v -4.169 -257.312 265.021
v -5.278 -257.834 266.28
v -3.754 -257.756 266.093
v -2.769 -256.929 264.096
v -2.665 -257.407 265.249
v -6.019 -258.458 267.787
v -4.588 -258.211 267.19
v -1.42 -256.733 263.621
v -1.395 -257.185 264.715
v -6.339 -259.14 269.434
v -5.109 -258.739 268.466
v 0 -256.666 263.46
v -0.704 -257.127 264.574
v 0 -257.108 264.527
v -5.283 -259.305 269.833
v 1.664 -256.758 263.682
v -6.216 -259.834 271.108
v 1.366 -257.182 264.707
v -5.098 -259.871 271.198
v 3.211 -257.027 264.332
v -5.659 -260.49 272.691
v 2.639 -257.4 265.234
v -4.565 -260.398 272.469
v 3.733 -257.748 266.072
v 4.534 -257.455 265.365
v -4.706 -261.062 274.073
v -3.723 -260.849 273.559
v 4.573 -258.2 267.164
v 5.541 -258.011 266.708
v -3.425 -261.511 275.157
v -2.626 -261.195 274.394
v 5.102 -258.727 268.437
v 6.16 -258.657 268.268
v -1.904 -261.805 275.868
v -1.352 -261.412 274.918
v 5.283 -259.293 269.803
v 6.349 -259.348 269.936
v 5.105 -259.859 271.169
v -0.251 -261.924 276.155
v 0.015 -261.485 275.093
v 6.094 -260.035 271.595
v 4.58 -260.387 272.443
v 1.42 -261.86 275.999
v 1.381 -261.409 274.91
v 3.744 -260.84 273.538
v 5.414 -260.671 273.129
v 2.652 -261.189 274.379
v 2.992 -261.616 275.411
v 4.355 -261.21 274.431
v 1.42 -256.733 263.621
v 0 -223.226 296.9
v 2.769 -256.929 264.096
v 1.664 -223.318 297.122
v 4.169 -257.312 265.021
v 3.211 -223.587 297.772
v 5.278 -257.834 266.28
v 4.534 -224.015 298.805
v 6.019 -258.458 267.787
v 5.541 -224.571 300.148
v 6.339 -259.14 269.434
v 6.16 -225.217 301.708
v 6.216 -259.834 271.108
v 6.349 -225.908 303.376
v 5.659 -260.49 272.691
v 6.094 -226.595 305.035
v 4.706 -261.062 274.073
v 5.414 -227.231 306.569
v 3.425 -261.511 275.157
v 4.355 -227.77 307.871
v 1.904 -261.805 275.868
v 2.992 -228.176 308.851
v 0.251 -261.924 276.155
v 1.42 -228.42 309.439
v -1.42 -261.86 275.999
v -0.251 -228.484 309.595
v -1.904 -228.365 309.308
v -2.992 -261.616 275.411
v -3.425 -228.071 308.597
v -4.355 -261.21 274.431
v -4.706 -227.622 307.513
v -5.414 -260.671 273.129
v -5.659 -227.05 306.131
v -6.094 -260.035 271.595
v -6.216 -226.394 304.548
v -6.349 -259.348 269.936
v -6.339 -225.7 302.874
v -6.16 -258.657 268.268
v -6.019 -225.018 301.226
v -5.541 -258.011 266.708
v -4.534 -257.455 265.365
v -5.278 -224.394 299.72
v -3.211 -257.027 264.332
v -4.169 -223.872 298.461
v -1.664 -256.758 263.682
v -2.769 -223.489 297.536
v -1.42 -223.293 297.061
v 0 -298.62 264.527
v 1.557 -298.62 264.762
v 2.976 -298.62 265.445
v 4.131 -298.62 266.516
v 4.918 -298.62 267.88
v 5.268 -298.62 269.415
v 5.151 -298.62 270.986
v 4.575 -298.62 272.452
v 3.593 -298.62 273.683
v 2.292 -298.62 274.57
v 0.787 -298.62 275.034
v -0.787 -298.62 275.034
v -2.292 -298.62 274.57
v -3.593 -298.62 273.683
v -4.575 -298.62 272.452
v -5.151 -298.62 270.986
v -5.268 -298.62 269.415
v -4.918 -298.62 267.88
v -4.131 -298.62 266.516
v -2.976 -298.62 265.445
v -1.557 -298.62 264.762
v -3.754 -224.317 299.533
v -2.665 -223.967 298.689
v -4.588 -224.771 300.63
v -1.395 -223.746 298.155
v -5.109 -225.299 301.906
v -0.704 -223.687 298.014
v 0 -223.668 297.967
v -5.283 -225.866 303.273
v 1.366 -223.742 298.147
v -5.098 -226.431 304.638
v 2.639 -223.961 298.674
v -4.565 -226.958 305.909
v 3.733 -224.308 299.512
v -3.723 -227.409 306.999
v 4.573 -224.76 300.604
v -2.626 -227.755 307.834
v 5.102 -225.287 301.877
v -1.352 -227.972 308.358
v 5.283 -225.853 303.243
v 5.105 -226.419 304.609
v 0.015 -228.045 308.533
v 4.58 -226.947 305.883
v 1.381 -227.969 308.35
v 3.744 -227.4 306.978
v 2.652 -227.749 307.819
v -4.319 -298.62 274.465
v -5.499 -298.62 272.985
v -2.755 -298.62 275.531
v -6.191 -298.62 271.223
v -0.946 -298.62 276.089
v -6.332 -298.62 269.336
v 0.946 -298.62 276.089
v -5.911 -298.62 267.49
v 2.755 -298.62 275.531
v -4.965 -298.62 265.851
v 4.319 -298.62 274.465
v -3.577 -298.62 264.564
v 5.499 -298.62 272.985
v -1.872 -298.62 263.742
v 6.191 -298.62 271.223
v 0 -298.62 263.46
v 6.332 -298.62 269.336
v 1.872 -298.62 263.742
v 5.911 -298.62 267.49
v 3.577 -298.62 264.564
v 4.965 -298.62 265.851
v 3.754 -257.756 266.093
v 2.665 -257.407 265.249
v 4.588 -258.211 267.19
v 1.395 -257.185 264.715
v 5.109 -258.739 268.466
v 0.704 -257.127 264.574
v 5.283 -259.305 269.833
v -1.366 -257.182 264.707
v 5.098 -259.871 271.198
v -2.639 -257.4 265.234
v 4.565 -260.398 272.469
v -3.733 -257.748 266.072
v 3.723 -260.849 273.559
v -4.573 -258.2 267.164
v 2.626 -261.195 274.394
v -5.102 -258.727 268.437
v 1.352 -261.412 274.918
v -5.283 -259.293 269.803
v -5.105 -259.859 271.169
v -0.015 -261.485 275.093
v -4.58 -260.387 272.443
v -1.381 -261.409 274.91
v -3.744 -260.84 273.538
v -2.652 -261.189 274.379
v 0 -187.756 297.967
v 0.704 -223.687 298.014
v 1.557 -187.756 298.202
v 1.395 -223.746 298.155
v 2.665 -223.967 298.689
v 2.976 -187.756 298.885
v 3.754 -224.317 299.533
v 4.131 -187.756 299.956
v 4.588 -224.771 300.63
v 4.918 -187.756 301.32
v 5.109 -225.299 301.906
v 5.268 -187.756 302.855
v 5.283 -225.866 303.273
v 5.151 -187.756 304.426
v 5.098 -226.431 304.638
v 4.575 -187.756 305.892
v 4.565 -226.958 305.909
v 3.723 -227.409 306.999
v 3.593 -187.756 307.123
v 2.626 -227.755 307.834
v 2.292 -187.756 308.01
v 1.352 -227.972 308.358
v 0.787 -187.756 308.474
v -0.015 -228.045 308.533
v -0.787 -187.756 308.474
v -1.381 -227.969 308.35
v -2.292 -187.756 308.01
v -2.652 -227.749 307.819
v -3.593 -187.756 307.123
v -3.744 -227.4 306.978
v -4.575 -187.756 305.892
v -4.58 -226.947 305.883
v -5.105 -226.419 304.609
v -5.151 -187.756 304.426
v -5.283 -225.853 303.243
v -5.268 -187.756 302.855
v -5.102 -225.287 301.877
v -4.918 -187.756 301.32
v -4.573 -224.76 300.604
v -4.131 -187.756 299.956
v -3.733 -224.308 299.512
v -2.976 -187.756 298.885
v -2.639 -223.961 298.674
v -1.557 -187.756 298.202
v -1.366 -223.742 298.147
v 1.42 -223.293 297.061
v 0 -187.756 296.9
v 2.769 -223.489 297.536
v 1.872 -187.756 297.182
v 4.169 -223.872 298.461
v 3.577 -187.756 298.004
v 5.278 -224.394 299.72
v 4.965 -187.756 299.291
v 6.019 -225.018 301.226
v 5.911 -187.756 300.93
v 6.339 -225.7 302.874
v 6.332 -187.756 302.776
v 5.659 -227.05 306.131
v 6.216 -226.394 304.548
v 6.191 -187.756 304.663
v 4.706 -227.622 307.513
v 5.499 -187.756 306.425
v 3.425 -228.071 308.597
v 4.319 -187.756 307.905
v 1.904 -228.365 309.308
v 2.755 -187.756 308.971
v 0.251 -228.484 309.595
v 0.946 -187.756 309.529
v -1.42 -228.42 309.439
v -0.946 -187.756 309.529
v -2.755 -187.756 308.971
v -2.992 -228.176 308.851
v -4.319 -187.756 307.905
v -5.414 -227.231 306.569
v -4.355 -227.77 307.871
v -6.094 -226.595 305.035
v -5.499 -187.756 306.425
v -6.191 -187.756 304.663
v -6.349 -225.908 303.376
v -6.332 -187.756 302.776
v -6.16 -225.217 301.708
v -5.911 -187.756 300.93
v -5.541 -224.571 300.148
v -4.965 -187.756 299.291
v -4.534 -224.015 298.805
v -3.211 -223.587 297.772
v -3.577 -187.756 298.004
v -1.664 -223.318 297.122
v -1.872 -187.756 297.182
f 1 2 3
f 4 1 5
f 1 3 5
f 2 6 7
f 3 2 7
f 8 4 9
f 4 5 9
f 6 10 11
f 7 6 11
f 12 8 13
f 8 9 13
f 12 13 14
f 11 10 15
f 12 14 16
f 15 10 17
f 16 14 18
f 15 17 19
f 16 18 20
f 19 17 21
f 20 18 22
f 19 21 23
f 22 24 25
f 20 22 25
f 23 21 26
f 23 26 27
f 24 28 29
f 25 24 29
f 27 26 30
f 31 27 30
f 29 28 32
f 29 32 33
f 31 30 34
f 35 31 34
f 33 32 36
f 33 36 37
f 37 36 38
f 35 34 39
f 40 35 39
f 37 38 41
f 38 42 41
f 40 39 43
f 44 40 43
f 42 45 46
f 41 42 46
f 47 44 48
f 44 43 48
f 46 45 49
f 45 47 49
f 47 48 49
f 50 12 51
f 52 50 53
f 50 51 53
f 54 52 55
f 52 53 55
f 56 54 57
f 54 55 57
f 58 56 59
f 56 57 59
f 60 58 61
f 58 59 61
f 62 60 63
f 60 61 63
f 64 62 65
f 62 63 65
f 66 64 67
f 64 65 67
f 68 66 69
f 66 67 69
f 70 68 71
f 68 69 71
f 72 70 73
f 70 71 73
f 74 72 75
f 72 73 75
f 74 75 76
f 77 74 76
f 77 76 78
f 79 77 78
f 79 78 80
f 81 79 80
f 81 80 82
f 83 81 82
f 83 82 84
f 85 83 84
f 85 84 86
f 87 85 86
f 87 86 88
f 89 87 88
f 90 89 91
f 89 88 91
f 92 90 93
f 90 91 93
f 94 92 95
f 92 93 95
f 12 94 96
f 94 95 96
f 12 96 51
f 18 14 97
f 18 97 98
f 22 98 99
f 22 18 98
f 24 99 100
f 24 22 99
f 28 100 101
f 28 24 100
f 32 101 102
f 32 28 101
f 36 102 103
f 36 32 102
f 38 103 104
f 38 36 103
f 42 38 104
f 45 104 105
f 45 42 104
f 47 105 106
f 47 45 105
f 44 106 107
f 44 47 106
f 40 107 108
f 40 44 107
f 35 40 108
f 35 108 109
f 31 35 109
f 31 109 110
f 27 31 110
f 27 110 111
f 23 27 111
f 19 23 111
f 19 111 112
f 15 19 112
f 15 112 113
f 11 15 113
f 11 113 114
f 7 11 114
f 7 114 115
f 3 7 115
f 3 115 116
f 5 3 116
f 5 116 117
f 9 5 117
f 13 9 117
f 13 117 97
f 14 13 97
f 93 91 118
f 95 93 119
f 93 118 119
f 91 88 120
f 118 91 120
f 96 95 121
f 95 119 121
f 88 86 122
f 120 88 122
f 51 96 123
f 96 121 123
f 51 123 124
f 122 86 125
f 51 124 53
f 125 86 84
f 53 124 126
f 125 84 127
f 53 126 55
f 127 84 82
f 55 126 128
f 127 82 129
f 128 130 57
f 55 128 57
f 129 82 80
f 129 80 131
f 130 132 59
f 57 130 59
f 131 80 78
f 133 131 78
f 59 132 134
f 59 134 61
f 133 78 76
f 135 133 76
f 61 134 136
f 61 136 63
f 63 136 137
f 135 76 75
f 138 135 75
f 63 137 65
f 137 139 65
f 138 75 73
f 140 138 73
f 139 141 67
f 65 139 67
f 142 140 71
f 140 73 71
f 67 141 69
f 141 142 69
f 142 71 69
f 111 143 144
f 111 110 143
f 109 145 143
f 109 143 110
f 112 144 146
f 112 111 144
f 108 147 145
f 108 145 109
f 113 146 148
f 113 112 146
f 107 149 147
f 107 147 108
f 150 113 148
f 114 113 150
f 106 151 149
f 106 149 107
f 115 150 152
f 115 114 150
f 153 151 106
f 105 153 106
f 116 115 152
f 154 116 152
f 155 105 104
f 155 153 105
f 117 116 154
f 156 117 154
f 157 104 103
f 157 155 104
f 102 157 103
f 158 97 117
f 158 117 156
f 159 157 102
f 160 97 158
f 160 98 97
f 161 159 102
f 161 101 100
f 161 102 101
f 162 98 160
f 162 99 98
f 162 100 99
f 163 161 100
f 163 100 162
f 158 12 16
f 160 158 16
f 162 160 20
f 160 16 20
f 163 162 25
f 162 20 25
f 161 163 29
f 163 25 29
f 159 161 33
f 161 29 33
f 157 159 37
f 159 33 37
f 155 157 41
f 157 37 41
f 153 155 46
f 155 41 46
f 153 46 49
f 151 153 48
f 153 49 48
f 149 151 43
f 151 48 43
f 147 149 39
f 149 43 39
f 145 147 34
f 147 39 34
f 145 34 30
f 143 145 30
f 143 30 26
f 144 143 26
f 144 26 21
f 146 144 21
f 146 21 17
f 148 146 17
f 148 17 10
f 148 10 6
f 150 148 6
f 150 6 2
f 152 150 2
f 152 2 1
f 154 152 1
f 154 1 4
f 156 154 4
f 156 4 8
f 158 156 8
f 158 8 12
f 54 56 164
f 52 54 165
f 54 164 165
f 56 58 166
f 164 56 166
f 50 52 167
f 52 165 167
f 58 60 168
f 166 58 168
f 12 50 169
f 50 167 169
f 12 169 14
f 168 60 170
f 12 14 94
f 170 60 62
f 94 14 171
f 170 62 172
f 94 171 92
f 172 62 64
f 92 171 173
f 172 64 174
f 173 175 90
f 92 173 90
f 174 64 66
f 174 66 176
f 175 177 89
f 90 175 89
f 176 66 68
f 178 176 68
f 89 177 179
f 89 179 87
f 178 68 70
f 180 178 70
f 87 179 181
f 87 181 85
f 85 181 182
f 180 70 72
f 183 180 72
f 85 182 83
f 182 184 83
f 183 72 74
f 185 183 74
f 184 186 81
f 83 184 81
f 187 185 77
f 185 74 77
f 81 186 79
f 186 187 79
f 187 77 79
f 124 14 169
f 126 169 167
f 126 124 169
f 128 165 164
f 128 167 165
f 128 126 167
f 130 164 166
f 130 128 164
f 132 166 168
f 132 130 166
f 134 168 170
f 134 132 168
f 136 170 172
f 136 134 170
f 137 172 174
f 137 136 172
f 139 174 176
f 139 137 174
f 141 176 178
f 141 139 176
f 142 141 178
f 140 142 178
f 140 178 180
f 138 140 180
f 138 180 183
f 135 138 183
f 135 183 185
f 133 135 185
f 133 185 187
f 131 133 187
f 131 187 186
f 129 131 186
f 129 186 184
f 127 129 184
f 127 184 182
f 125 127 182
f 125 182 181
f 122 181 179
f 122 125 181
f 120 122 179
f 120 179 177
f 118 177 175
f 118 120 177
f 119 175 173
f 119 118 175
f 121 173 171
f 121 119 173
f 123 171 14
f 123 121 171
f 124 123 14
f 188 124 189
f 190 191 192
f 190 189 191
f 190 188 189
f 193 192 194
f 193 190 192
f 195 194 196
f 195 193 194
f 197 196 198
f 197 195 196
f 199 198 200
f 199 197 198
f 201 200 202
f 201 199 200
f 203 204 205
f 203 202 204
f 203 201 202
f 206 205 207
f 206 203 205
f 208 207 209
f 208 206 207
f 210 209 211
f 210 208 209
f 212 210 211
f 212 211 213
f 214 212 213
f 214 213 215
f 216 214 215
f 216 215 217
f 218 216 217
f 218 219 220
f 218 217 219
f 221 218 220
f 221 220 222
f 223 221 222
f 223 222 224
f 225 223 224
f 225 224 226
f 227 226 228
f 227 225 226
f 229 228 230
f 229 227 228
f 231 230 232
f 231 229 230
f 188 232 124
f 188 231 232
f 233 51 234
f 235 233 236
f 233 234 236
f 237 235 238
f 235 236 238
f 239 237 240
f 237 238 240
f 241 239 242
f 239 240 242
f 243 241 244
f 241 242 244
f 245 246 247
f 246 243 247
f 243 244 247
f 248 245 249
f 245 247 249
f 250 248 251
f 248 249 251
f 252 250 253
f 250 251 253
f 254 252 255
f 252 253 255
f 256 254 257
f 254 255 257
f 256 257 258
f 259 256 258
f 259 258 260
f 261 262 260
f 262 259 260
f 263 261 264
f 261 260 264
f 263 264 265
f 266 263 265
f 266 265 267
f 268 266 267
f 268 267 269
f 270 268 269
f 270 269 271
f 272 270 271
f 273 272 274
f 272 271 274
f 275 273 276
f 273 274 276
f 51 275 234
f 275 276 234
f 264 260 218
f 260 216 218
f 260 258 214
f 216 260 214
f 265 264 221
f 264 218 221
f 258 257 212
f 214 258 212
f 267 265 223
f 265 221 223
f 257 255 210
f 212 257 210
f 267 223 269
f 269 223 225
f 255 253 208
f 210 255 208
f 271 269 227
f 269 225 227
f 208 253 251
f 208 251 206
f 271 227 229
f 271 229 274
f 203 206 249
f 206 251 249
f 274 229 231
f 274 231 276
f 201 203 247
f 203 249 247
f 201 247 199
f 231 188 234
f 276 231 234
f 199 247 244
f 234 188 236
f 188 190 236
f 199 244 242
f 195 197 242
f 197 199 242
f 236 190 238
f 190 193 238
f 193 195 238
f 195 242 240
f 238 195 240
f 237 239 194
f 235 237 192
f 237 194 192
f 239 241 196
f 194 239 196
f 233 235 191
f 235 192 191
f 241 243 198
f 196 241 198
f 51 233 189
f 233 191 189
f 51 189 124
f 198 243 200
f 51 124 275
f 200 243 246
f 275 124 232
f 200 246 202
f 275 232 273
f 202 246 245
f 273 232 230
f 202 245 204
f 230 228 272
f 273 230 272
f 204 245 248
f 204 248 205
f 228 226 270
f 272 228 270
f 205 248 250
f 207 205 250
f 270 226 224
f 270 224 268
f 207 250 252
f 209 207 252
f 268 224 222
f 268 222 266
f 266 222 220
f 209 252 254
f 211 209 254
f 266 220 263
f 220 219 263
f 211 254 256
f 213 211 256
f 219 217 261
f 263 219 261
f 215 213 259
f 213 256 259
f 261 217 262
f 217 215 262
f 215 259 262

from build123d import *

# Parameters (mm, degrees)
SKETCH11_R                = 6.35
SKETCH11_R_2              = 5.2832
PIPE_0_5_SCH_40_1_DEPTH   = 42.819743879
SKETCH11_ON_SEGMENT_2_R   = 6.35
SKETCH11_ON_SEGMENT_2_R_2 = 5.2832
PIPE_0_5_SCH_40_1_2_DEPTH = 56.730691165
SKETCH11_ON_SEGMENT_3_R   = 6.35
SKETCH11_ON_SEGMENT_3_R_2 = 5.2832
PIPE_0_5_SCH_40_1_3_DEPTH = 44.043224164


with BuildPart() as part:
    # Sketch11 → Pipe 0.5 SCH 40(1) (new body)
    with BuildSketch(Plane(origin=(0, -187.756263613, 303.250213328), x_dir=(0, 0, -1), z_dir=(0, -1, 0))):
        Circle(SKETCH11_R)
        Circle(SKETCH11_R_2, mode=Mode.SUBTRACT)
    extrude(amount=PIPE_0_5_SCH_40_1_DEPTH)

    # Pipe 0.5 SCH 40(1) mitre 1
    split(bisect_by=Plane(origin=(0, -225.856263613, 303.250213328), x_dir=(-1, 0, 0), z_dir=(0, 0.923879533, 0.382683432)), keep=Keep.TOP)


with BuildPart() as body_2:
    # Sketch11 on segment 2 (carried to segment 2) → Pipe 0.5 SCH 40_1 2 (new body)
    with BuildSketch(Plane(origin=(0, -222.518900711, 306.58757623), x_dir=(0, 0.707106781, -0.707106781), z_dir=(0, -0.707106781, -0.707106781))):
        Circle(SKETCH11_ON_SEGMENT_2_R)
        Circle(SKETCH11_ON_SEGMENT_2_R_2, mode=Mode.SUBTRACT)
    extrude(amount=PIPE_0_5_SCH_40_1_2_DEPTH)

    # Pipe 0.5 SCH 40_1 2 mitre 1
    split(bisect_by=Plane(origin=(0, -225.856263613, 303.250213328), x_dir=(1, 0, 0), z_dir=(0, -0.923879533, -0.382683432)), keep=Keep.TOP)

    # Pipe 0.5 SCH 40_1 2 mitre 2
    split(bisect_by=Plane(origin=(0, -259.296194232, 269.810282709), x_dir=(-1, 0, 0), z_dir=(0, 0.923879533, 0.382683432)), keep=Keep.TOP)


with BuildPart() as body_3:
    # Sketch11 on segment 3 (carried to segment 3) → Pipe 0.5 SCH 40_1 3 (new body)
    with BuildSketch(Plane(origin=(0, -254.576450353, 269.810282709), x_dir=(0, 0, -1), z_dir=(0, -1, 0))):
        Circle(SKETCH11_ON_SEGMENT_3_R)
        Circle(SKETCH11_ON_SEGMENT_3_R_2, mode=Mode.SUBTRACT)
    extrude(amount=PIPE_0_5_SCH_40_1_3_DEPTH)

    # Pipe 0.5 SCH 40_1 3 mitre 1
    split(bisect_by=Plane(origin=(0, -259.296194232, 269.810282709), x_dir=(1, 0, 0), z_dir=(0, -0.923879533, -0.382683432)), keep=Keep.TOP)


solid = Compound([part.part, body_2.part, body_3.part])
